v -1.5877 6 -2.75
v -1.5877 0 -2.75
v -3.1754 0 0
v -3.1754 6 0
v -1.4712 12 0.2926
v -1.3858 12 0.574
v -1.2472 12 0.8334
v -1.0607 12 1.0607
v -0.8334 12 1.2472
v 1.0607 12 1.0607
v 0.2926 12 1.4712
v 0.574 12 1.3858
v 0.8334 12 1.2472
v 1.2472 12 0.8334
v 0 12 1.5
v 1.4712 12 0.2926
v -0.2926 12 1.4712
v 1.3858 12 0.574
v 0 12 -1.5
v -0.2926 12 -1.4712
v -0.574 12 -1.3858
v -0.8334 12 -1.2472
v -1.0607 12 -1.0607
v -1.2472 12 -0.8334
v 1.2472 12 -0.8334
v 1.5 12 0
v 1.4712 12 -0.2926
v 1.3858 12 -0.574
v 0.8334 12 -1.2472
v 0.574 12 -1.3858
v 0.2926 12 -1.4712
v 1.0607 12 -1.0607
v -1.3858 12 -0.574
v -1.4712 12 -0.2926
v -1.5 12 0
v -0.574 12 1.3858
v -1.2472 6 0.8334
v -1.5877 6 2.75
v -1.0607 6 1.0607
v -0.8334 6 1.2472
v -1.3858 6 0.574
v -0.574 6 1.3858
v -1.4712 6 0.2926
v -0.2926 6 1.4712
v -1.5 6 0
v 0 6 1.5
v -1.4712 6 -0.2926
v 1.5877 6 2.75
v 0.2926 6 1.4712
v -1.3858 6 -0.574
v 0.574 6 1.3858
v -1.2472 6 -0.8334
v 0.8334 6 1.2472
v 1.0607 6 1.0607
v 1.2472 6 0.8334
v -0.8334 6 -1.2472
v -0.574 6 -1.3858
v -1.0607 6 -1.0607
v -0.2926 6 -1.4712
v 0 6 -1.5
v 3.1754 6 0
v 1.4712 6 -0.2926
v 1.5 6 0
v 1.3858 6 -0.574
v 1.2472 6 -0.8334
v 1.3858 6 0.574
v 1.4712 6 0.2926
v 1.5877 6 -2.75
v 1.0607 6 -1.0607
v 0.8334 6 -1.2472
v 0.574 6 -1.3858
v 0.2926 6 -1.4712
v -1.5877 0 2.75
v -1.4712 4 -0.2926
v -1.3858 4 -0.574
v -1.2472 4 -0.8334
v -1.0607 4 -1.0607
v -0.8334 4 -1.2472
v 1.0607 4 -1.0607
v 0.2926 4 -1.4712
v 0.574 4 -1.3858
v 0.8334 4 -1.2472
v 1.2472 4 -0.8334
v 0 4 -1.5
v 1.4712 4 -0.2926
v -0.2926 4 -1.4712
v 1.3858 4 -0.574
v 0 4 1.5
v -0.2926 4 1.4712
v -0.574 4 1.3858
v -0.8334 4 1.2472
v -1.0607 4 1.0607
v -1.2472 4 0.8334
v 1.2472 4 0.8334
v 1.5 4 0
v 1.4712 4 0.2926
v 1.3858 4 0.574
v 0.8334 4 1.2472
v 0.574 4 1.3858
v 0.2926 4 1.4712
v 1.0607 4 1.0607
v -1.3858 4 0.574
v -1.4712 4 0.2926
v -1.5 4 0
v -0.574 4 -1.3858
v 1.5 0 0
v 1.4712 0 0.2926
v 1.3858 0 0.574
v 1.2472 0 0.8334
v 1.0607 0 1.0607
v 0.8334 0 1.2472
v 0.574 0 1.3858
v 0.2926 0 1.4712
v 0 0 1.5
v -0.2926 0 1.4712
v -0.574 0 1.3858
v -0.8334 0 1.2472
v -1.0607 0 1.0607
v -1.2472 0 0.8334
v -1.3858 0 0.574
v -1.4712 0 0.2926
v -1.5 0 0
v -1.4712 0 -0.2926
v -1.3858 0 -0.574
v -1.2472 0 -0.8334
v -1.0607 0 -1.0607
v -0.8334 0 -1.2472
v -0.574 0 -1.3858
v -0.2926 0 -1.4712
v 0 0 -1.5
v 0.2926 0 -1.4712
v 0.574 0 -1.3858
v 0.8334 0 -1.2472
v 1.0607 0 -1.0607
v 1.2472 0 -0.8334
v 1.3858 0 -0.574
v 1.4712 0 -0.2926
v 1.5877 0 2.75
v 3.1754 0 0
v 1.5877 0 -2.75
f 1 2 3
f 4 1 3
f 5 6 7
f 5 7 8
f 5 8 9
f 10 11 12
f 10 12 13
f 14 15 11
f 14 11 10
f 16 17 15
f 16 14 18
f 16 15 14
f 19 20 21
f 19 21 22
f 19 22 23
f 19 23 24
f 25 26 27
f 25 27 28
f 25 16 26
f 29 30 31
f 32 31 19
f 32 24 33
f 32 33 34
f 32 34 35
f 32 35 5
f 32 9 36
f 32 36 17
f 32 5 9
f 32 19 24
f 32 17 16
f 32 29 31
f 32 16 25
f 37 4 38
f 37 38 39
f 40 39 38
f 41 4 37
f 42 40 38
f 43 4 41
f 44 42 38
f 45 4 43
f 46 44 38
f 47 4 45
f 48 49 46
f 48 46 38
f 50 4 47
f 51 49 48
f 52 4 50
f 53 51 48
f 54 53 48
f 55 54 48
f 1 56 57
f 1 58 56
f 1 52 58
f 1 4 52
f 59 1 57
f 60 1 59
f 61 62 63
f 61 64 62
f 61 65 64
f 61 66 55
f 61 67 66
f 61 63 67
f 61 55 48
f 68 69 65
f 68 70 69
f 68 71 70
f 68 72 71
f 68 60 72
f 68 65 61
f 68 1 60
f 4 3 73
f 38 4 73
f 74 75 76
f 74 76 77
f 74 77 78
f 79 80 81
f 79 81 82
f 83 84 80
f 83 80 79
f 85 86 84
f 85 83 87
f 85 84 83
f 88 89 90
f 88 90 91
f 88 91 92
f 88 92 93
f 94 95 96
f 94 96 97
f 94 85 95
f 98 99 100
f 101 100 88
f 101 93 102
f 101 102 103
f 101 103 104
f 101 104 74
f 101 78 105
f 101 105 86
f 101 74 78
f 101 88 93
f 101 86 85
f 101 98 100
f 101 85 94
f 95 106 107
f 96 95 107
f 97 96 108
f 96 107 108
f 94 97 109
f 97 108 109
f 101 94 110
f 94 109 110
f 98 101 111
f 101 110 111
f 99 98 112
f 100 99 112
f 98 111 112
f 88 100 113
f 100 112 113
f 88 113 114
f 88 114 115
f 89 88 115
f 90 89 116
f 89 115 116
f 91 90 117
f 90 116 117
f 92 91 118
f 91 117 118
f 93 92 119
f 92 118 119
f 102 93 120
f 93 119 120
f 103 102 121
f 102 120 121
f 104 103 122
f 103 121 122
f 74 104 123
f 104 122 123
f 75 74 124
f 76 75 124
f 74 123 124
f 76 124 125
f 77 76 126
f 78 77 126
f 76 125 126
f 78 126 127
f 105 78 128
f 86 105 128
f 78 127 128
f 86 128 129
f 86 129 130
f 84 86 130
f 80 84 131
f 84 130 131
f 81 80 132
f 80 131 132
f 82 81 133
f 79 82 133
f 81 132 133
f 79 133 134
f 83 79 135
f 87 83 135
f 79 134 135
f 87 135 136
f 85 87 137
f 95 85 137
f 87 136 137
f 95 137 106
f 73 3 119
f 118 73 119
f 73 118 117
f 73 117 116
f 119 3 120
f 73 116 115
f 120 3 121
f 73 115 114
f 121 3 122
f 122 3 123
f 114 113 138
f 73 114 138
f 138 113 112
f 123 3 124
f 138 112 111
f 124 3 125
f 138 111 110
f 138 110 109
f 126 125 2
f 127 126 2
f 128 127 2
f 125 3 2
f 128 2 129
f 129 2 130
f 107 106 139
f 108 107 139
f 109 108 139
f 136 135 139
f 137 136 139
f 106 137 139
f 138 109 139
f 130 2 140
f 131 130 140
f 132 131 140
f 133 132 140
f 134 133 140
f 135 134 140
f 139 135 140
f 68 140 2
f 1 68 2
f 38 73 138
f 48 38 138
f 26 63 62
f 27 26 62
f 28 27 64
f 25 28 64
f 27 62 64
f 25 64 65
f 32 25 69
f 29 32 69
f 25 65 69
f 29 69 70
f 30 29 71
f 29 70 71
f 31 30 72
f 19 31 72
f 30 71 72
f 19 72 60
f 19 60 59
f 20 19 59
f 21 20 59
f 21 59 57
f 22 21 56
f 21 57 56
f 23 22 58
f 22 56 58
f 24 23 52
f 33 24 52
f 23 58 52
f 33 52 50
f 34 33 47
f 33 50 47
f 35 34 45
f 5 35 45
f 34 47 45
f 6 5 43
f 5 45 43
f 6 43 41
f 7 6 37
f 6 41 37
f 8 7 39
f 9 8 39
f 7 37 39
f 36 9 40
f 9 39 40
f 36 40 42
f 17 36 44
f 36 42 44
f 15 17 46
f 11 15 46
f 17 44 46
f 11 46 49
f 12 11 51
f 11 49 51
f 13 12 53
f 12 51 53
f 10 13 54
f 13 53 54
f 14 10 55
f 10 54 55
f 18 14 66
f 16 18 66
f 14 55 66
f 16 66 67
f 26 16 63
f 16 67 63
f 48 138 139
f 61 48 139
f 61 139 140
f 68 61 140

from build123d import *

# Parameters (mm, degrees)
EXTRUDE_1_DEPTH     = 6
SKETCH_2_R          = 1.5
CUT_EXTRUDE_1_DEPTH = 4
SKETCH_3_R          = 1.5
EXTRUDE_2_DEPTH     = 6


with BuildPart() as part:
    # 草图1 → 凸台-拉伸1 (new body)
    with BuildSketch(Plane(origin=(0, 0, 0), x_dir=(1, 0, 0), z_dir=(0, 1, 0))):
        Polygon((3.175426481, 0), (1.58771324, 2.75), (-1.58771324, 2.75), (-3.175426481, 0), (-1.58771324, -2.75), (1.58771324, -2.75), align=None)
    extrude(amount=EXTRUDE_1_DEPTH)

    # 草图2 → 切除-拉伸1 (cut)
    with BuildSketch(Plane.XZ):
        Circle(SKETCH_2_R)
    extrude(amount=-CUT_EXTRUDE_1_DEPTH, mode=Mode.SUBTRACT)

    # 草图3 → 凸台-拉伸2 (add)
    with BuildSketch(Plane(origin=(0, 6, 0), x_dir=(1, 0, 0), z_dir=(0, 1, 0))):
        Circle(SKETCH_3_R)
    extrude(amount=EXTRUDE_2_DEPTH)


solid = part.part
